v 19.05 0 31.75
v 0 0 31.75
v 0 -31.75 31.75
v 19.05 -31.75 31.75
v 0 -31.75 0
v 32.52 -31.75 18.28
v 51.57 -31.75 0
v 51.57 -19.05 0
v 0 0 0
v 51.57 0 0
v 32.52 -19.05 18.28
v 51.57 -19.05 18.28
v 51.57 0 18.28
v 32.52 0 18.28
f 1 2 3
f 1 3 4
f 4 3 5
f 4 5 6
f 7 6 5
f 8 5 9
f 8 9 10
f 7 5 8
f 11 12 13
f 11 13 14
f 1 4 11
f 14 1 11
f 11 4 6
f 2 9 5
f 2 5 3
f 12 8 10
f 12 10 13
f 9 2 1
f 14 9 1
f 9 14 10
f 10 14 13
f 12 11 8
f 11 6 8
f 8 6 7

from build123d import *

# Parameters (mm, degrees)
F0_W     = 50.8
F0_H     = 31.75
F1_DEPTH = 31.75
F3_DEPTH = 31.75
F5_DEPTH = 31.75
F7_DEPTH = 12.7


with BuildPart() as f1:
    # F0 (on Front) → F1 (new body)
    with BuildSketch(Plane.XZ):
        with Locations((25.4, 15.875)):
            Rectangle(F0_W, F0_H)
    extrude(amount=F1_DEPTH)

    # F2 (on face) → F3 (cut)
    with BuildSketch(Plane.XZ.offset(31.75)):
        Polygon((50.8, 31.75), (19.05, 31.75), (50.8, 0), align=None)
    extrude(amount=-F3_DEPTH, mode=Mode.SUBTRACT)

    # F4 (on face) → F5 (join)
    with BuildSketch(Plane.XZ.offset(31.75)):
        Polygon((51.5703841816, 18.2796158184), (32.5203841816, 18.2796158184), (50.8, 0), (51.5703841816, 0), align=None)
    extrude(amount=-F5_DEPTH)

    # F6 (on face) → F7 (cut)
    with BuildSketch(Plane.XZ.offset(31.75)):
        Polygon((51.5703841816, 18.2796158184), (32.5203841816, 18.2796158184), (51.5703841816, 0), align=None)
    extrude(amount=-F7_DEPTH, mode=Mode.SUBTRACT)


solid = f1.part
